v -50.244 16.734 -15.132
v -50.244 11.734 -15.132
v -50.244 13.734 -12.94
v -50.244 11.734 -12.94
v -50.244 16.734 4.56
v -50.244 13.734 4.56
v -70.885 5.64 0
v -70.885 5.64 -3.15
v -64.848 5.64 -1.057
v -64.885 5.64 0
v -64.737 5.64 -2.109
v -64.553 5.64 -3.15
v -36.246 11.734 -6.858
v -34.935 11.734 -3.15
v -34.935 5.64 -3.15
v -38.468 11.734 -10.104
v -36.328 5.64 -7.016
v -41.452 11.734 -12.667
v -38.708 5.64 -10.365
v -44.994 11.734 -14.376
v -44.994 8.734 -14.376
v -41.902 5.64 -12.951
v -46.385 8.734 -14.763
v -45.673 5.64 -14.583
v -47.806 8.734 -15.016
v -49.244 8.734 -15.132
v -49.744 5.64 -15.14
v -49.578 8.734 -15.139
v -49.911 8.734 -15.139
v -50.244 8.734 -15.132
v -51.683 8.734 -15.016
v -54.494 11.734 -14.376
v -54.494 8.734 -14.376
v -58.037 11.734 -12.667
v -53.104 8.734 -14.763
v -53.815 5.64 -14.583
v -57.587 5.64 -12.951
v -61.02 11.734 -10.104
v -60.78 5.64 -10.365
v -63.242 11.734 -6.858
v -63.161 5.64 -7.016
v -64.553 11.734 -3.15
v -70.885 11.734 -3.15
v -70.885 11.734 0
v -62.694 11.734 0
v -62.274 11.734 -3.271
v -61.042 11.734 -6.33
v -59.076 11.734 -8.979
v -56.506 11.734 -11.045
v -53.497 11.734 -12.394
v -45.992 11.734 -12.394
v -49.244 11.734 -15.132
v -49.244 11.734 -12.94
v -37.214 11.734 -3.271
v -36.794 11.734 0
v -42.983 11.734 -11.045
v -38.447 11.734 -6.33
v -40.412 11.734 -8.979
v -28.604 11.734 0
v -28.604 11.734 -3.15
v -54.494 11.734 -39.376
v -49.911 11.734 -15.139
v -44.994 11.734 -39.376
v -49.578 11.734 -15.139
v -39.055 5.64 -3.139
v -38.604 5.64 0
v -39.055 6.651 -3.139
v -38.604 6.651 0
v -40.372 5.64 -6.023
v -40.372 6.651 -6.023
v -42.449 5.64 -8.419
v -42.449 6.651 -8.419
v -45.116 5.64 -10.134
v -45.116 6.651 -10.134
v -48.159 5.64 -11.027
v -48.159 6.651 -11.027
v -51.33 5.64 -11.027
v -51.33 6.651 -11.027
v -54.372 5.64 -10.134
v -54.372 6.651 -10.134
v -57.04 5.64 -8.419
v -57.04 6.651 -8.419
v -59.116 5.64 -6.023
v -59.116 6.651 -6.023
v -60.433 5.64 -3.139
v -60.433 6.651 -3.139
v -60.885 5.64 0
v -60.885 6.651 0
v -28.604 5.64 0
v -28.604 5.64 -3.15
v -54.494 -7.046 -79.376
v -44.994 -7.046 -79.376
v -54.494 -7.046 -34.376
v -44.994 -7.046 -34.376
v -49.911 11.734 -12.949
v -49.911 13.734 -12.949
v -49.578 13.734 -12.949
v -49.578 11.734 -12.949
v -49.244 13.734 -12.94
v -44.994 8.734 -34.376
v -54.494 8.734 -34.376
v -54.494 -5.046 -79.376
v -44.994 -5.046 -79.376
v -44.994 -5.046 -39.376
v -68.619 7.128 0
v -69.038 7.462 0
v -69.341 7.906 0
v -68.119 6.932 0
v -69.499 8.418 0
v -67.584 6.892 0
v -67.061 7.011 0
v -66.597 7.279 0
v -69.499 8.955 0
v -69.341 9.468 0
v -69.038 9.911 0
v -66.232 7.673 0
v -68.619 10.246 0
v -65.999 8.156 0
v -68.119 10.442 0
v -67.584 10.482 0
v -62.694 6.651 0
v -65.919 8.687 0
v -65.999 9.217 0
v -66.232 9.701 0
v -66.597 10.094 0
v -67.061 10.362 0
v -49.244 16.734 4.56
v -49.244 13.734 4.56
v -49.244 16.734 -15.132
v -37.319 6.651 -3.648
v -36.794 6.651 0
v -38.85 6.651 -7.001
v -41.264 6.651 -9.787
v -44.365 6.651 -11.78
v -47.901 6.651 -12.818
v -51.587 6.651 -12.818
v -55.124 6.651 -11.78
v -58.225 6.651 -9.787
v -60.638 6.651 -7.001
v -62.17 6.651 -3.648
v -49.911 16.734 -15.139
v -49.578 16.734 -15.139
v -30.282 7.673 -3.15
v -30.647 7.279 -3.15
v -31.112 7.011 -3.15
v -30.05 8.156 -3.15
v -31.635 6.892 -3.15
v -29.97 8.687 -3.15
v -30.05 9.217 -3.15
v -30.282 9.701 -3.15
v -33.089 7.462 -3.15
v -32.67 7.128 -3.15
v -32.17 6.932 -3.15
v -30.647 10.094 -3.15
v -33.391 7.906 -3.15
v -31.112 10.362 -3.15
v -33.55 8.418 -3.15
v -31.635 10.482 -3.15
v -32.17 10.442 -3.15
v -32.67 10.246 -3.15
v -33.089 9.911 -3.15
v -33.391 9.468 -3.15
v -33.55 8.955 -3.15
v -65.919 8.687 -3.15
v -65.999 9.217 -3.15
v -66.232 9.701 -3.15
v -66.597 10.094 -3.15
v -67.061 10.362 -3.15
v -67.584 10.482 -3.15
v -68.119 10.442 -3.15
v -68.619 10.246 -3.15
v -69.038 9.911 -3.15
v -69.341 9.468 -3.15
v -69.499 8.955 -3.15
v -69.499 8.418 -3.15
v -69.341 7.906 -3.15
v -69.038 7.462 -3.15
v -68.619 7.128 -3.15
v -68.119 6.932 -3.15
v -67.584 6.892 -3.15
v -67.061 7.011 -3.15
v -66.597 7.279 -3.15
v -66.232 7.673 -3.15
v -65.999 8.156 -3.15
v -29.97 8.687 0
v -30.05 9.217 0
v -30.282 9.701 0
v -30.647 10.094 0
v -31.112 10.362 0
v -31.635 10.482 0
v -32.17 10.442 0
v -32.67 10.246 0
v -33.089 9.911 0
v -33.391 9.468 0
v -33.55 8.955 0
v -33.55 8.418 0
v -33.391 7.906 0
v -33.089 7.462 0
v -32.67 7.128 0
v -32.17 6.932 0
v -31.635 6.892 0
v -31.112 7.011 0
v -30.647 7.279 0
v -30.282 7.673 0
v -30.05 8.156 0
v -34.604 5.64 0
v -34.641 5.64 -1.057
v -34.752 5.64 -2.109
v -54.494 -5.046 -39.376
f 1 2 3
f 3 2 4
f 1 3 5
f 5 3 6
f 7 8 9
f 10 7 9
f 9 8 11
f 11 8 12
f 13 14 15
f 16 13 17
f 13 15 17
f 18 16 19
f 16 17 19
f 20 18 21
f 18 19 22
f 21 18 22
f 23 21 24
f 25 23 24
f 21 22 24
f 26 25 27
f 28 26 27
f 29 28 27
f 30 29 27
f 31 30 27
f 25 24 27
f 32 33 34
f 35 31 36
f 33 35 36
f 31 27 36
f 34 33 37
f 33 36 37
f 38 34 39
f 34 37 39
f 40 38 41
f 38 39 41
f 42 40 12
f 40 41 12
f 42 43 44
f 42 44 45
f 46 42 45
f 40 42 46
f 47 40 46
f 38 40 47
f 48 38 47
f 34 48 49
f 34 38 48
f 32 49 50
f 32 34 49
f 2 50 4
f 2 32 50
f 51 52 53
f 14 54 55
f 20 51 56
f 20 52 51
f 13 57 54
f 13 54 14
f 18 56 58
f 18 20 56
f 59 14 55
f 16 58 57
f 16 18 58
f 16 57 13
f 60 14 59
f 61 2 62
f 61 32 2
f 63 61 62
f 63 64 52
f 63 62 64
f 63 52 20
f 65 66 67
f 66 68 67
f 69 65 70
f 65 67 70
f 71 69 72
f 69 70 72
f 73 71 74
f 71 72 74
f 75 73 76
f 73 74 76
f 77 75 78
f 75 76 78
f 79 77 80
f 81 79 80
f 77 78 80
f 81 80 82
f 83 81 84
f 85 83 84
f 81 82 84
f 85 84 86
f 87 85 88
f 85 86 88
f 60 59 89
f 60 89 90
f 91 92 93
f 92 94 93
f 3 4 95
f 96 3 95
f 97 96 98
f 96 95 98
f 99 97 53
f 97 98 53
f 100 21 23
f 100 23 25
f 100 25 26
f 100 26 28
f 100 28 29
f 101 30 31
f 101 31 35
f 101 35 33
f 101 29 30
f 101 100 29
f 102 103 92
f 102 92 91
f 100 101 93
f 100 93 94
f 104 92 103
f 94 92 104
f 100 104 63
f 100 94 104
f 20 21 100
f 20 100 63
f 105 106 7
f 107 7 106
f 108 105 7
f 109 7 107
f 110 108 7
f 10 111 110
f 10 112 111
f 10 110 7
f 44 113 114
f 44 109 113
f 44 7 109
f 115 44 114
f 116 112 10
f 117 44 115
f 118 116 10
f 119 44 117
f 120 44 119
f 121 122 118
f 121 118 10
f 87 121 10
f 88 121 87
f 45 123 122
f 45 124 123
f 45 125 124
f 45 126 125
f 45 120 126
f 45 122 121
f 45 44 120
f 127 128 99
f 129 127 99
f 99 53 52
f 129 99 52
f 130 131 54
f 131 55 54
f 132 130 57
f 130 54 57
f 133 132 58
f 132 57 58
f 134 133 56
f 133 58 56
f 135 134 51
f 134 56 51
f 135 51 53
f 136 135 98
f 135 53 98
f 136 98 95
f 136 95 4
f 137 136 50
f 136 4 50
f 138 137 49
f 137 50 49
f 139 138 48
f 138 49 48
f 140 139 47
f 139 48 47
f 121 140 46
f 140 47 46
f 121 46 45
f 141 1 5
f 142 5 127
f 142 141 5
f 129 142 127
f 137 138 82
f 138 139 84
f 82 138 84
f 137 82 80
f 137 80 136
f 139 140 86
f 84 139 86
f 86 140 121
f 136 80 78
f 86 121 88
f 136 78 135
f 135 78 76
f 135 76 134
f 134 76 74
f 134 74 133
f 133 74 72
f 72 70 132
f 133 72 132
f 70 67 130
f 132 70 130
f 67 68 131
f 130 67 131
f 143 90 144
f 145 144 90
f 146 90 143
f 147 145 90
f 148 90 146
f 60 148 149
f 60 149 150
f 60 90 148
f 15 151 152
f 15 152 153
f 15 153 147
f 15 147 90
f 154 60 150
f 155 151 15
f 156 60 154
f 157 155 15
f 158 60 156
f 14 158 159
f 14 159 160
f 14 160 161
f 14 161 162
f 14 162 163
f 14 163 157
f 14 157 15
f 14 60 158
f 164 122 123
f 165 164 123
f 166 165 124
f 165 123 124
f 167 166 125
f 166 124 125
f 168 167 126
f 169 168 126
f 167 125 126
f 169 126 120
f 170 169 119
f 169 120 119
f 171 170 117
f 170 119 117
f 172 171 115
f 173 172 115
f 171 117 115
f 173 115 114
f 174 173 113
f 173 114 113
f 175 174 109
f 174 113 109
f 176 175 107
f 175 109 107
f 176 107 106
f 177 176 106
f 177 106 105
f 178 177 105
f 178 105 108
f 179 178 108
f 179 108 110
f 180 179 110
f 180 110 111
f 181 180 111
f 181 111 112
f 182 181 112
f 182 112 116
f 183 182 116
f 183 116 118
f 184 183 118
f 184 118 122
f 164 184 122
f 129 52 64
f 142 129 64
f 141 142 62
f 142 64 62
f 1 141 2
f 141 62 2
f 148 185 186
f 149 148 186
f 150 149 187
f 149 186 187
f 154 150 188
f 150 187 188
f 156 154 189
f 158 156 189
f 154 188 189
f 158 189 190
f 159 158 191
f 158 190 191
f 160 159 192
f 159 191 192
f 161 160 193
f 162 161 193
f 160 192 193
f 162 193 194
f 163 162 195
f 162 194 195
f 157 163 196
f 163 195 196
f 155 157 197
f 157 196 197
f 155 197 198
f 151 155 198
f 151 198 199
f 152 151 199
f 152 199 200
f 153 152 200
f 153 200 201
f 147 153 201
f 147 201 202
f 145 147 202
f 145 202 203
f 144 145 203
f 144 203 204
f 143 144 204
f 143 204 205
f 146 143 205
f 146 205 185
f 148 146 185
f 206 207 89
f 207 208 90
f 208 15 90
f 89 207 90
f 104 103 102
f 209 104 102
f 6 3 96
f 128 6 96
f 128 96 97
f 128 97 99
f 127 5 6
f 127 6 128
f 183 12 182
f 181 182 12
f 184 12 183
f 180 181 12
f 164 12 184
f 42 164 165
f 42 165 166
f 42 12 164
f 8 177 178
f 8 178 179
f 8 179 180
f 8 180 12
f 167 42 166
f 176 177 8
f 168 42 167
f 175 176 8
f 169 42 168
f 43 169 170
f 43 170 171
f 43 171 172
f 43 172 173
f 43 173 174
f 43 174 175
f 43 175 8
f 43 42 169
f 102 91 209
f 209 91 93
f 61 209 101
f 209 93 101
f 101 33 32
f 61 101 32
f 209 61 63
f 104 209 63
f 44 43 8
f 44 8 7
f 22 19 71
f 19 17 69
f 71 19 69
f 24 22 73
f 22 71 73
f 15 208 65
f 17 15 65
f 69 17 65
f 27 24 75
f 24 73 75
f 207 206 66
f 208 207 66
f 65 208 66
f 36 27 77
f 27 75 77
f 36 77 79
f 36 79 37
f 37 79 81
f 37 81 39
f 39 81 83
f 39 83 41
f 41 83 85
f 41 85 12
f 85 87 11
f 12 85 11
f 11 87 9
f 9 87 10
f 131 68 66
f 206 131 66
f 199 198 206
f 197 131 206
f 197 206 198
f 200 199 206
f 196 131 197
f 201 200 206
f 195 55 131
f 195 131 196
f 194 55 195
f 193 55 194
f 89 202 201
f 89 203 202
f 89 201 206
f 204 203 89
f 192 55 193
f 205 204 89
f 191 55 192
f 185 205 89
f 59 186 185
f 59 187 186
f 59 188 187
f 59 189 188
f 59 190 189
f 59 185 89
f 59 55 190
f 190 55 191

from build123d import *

# Parameters (mm, degrees)
BOSS_EXTRUDE1_DEPTH = 5
BOSS_EXTRUDE2_DEPTH = 3
BOSS_EXTRUDE3_DEPTH = 3
SKETCH10_W          = 9.5
SKETCH10_H          = 5
BOSS_EXTRUDE4_DEPTH = 15.78
SKETCH11_W          = 9.5
SKETCH11_H          = 2
BOSS_EXTRUDE5_DEPTH = 40
BOSS_EXTRUDE6_DEPTH = 6.09393
SKETCH14_R          = 1.8
CUT_EXTRUDE1_DEPTH  = 6.3
SKETCH15_W          = 51.153217575
SKETCH15_H          = 31.902182189
CUT_EXTRUDE3_DEPTH  = 19.78


with BuildPart() as part:
    # Sketch3 → Revolve1 (revolve)
    with BuildSketch(Plane.XY):
        Polygon((-62.694264441, 10.250679103), (-62.694264441, 11.733728816), (-64.884531744, 11.733728816), (-64.884531744, 5.639799249), (-60.884531744, 5.639799249), (-60.884531744, 6.650679103), (-62.694264441, 6.650679103), align=None)
    revolve(axis=Axis((-49.744264441, 0, 0), (0, 1, 0)))

    # Sketch7 → Boss-Extrude1 (add)
    with BuildSketch(Plane(origin=(0, 11.733728816, 0), x_dir=(1, 0, 0), z_dir=(0, 1, 0))):
        with BuildLine():
            Line((-50.244264441, 15.132008921), (-50.244264441, 12.94034389))
            ThreePointArc((-50.244264441, 12.94034389), (-49.744264441, 12.95), (-49.244264441, 12.94034389))
            Line((-49.244264441, 12.94034389), (-49.244264441, 15.132008921))
            ThreePointArc((-49.244264441, 15.132008921), (-49.744264441, 15.140267302), (-50.244264441, 15.132008921))
        make_face()
    extrude(amount=BOSS_EXTRUDE1_DEPTH)

    # Sketch8 → Boss-Extrude2 (add)
    with BuildSketch(Plane(origin=(0, 16.733728816, 0), x_dir=(1, 0, 0), z_dir=(0, 1, 0))):
        with BuildLine():
            Line((-50.244264441, 15.132008921), (-50.244264441, 12.94034389))
            Line((-50.244264441, 12.94034389), (-50.244264441, -4.55965611))
            Line((-50.244264441, -4.55965611), (-49.244264441, -4.55965611))
            Line((-49.244264441, -4.55965611), (-49.244264441, 12.94034389))
            Line((-49.244264441, 12.94034389), (-49.244264441, 15.132008921))
            ThreePointArc((-49.244264441, 15.132008921), (-49.744264441, 15.140267302), (-50.244264441, 15.132008921))
        make_face()
    extrude(amount=-BOSS_EXTRUDE2_DEPTH)

    # Sketch9 → Boss-Extrude3 (add)
    with BuildSketch(Plane(origin=(0, 11.733728816, 0), x_dir=(1, 0, 0), z_dir=(0, 1, 0))):
        with BuildLine():
            Line((-54.494264441, 14.375854548), (-54.494264441, 39.375854548))
            Line((-54.494264441, 39.375854548), (-44.994264441, 39.375854548))
            Line((-44.994264441, 39.375854548), (-44.994264441, 14.375854548))
            ThreePointArc((-44.994264441, 14.375854548), (-47.092177082, 14.906177465), (-49.244264441, 15.132008921))
            ThreePointArc((-49.244264441, 15.132008921), (-49.744264441, 15.140267302), (-50.244264441, 15.132008921))
            ThreePointArc((-50.244264441, 15.132008921), (-52.3963518, 14.906177465), (-54.494264441, 14.375854548))
        make_face()
    extrude(amount=-BOSS_EXTRUDE3_DEPTH)

    # Sketch10 → Boss-Extrude4 (add)
    with BuildSketch(Plane.XZ.offset(-8.733728816)):
        with Locations((-49.744264441, -36.875854548)):
            Rectangle(SKETCH10_W, SKETCH10_H)
    extrude(amount=BOSS_EXTRUDE4_DEPTH)

    # Sketch11 → Boss-Extrude5 (add)
    with BuildSketch(Plane(origin=(0, 0, -39.375854548), x_dir=(-1, 0, 0), z_dir=(0, 0, -1))):
        with Locations((49.744264441, -6.046271184)):
            Rectangle(SKETCH11_W, SKETCH11_H)
    extrude(amount=BOSS_EXTRUDE5_DEPTH)

    # Sketch13 → Boss-Extrude6 (add)
    with BuildSketch(Plane(origin=(0, 11.733728816, 0), x_dir=(1, 0, 0), z_dir=(0, 1, 0))):
        with BuildLine():
            Line((-28.603997139, 3.15), (-34.935307895, 3.15))
            ThreePointArc((-34.935307895, 3.15), (-34.603997139, 0), (-34.935307895, -3.15))
            Line((-34.935307895, -3.15), (-28.603997139, -3.15))
            Line((-28.603997139, -3.15), (-28.603997139, 3.15))
        make_face()
        with BuildLine():
            Line((-70.884531744, 3.15), (-70.884531744, -3.15))
            Line((-70.884531744, -3.15), (-64.553220987, -3.15))
            ThreePointArc((-64.553220987, -3.15), (-64.884531744, 0), (-64.553220987, 3.15))
            Line((-64.553220987, 3.15), (-70.884531744, 3.15))
        make_face()
    extrude(amount=-BOSS_EXTRUDE6_DEPTH)

    # Sketch14 → Cut-Extrude1 (cut)
    with BuildSketch(Plane.XY.offset(3.15)):
        with Locations((-31.769652517, 8.686764033)):
            Circle(SKETCH14_R)
        with Locations((-67.718876365, 8.686764033)):
            Circle(SKETCH14_R)
    extrude(amount=-CUT_EXTRUDE1_DEPTH, mode=Mode.SUBTRACT)

    # Sketch15 → Cut-Extrude3 (cut, through all)
    with BuildSketch(Plane(origin=(0, 11.733728816, 0), x_dir=(1, 0, 0), z_dir=(0, 1, 0))):
        with Locations((-49.018725857, -15.951091095)):
            Rectangle(SKETCH15_W, SKETCH15_H)
    extrude(amount=-CUT_EXTRUDE3_DEPTH, mode=Mode.SUBTRACT)


solid = part.part
